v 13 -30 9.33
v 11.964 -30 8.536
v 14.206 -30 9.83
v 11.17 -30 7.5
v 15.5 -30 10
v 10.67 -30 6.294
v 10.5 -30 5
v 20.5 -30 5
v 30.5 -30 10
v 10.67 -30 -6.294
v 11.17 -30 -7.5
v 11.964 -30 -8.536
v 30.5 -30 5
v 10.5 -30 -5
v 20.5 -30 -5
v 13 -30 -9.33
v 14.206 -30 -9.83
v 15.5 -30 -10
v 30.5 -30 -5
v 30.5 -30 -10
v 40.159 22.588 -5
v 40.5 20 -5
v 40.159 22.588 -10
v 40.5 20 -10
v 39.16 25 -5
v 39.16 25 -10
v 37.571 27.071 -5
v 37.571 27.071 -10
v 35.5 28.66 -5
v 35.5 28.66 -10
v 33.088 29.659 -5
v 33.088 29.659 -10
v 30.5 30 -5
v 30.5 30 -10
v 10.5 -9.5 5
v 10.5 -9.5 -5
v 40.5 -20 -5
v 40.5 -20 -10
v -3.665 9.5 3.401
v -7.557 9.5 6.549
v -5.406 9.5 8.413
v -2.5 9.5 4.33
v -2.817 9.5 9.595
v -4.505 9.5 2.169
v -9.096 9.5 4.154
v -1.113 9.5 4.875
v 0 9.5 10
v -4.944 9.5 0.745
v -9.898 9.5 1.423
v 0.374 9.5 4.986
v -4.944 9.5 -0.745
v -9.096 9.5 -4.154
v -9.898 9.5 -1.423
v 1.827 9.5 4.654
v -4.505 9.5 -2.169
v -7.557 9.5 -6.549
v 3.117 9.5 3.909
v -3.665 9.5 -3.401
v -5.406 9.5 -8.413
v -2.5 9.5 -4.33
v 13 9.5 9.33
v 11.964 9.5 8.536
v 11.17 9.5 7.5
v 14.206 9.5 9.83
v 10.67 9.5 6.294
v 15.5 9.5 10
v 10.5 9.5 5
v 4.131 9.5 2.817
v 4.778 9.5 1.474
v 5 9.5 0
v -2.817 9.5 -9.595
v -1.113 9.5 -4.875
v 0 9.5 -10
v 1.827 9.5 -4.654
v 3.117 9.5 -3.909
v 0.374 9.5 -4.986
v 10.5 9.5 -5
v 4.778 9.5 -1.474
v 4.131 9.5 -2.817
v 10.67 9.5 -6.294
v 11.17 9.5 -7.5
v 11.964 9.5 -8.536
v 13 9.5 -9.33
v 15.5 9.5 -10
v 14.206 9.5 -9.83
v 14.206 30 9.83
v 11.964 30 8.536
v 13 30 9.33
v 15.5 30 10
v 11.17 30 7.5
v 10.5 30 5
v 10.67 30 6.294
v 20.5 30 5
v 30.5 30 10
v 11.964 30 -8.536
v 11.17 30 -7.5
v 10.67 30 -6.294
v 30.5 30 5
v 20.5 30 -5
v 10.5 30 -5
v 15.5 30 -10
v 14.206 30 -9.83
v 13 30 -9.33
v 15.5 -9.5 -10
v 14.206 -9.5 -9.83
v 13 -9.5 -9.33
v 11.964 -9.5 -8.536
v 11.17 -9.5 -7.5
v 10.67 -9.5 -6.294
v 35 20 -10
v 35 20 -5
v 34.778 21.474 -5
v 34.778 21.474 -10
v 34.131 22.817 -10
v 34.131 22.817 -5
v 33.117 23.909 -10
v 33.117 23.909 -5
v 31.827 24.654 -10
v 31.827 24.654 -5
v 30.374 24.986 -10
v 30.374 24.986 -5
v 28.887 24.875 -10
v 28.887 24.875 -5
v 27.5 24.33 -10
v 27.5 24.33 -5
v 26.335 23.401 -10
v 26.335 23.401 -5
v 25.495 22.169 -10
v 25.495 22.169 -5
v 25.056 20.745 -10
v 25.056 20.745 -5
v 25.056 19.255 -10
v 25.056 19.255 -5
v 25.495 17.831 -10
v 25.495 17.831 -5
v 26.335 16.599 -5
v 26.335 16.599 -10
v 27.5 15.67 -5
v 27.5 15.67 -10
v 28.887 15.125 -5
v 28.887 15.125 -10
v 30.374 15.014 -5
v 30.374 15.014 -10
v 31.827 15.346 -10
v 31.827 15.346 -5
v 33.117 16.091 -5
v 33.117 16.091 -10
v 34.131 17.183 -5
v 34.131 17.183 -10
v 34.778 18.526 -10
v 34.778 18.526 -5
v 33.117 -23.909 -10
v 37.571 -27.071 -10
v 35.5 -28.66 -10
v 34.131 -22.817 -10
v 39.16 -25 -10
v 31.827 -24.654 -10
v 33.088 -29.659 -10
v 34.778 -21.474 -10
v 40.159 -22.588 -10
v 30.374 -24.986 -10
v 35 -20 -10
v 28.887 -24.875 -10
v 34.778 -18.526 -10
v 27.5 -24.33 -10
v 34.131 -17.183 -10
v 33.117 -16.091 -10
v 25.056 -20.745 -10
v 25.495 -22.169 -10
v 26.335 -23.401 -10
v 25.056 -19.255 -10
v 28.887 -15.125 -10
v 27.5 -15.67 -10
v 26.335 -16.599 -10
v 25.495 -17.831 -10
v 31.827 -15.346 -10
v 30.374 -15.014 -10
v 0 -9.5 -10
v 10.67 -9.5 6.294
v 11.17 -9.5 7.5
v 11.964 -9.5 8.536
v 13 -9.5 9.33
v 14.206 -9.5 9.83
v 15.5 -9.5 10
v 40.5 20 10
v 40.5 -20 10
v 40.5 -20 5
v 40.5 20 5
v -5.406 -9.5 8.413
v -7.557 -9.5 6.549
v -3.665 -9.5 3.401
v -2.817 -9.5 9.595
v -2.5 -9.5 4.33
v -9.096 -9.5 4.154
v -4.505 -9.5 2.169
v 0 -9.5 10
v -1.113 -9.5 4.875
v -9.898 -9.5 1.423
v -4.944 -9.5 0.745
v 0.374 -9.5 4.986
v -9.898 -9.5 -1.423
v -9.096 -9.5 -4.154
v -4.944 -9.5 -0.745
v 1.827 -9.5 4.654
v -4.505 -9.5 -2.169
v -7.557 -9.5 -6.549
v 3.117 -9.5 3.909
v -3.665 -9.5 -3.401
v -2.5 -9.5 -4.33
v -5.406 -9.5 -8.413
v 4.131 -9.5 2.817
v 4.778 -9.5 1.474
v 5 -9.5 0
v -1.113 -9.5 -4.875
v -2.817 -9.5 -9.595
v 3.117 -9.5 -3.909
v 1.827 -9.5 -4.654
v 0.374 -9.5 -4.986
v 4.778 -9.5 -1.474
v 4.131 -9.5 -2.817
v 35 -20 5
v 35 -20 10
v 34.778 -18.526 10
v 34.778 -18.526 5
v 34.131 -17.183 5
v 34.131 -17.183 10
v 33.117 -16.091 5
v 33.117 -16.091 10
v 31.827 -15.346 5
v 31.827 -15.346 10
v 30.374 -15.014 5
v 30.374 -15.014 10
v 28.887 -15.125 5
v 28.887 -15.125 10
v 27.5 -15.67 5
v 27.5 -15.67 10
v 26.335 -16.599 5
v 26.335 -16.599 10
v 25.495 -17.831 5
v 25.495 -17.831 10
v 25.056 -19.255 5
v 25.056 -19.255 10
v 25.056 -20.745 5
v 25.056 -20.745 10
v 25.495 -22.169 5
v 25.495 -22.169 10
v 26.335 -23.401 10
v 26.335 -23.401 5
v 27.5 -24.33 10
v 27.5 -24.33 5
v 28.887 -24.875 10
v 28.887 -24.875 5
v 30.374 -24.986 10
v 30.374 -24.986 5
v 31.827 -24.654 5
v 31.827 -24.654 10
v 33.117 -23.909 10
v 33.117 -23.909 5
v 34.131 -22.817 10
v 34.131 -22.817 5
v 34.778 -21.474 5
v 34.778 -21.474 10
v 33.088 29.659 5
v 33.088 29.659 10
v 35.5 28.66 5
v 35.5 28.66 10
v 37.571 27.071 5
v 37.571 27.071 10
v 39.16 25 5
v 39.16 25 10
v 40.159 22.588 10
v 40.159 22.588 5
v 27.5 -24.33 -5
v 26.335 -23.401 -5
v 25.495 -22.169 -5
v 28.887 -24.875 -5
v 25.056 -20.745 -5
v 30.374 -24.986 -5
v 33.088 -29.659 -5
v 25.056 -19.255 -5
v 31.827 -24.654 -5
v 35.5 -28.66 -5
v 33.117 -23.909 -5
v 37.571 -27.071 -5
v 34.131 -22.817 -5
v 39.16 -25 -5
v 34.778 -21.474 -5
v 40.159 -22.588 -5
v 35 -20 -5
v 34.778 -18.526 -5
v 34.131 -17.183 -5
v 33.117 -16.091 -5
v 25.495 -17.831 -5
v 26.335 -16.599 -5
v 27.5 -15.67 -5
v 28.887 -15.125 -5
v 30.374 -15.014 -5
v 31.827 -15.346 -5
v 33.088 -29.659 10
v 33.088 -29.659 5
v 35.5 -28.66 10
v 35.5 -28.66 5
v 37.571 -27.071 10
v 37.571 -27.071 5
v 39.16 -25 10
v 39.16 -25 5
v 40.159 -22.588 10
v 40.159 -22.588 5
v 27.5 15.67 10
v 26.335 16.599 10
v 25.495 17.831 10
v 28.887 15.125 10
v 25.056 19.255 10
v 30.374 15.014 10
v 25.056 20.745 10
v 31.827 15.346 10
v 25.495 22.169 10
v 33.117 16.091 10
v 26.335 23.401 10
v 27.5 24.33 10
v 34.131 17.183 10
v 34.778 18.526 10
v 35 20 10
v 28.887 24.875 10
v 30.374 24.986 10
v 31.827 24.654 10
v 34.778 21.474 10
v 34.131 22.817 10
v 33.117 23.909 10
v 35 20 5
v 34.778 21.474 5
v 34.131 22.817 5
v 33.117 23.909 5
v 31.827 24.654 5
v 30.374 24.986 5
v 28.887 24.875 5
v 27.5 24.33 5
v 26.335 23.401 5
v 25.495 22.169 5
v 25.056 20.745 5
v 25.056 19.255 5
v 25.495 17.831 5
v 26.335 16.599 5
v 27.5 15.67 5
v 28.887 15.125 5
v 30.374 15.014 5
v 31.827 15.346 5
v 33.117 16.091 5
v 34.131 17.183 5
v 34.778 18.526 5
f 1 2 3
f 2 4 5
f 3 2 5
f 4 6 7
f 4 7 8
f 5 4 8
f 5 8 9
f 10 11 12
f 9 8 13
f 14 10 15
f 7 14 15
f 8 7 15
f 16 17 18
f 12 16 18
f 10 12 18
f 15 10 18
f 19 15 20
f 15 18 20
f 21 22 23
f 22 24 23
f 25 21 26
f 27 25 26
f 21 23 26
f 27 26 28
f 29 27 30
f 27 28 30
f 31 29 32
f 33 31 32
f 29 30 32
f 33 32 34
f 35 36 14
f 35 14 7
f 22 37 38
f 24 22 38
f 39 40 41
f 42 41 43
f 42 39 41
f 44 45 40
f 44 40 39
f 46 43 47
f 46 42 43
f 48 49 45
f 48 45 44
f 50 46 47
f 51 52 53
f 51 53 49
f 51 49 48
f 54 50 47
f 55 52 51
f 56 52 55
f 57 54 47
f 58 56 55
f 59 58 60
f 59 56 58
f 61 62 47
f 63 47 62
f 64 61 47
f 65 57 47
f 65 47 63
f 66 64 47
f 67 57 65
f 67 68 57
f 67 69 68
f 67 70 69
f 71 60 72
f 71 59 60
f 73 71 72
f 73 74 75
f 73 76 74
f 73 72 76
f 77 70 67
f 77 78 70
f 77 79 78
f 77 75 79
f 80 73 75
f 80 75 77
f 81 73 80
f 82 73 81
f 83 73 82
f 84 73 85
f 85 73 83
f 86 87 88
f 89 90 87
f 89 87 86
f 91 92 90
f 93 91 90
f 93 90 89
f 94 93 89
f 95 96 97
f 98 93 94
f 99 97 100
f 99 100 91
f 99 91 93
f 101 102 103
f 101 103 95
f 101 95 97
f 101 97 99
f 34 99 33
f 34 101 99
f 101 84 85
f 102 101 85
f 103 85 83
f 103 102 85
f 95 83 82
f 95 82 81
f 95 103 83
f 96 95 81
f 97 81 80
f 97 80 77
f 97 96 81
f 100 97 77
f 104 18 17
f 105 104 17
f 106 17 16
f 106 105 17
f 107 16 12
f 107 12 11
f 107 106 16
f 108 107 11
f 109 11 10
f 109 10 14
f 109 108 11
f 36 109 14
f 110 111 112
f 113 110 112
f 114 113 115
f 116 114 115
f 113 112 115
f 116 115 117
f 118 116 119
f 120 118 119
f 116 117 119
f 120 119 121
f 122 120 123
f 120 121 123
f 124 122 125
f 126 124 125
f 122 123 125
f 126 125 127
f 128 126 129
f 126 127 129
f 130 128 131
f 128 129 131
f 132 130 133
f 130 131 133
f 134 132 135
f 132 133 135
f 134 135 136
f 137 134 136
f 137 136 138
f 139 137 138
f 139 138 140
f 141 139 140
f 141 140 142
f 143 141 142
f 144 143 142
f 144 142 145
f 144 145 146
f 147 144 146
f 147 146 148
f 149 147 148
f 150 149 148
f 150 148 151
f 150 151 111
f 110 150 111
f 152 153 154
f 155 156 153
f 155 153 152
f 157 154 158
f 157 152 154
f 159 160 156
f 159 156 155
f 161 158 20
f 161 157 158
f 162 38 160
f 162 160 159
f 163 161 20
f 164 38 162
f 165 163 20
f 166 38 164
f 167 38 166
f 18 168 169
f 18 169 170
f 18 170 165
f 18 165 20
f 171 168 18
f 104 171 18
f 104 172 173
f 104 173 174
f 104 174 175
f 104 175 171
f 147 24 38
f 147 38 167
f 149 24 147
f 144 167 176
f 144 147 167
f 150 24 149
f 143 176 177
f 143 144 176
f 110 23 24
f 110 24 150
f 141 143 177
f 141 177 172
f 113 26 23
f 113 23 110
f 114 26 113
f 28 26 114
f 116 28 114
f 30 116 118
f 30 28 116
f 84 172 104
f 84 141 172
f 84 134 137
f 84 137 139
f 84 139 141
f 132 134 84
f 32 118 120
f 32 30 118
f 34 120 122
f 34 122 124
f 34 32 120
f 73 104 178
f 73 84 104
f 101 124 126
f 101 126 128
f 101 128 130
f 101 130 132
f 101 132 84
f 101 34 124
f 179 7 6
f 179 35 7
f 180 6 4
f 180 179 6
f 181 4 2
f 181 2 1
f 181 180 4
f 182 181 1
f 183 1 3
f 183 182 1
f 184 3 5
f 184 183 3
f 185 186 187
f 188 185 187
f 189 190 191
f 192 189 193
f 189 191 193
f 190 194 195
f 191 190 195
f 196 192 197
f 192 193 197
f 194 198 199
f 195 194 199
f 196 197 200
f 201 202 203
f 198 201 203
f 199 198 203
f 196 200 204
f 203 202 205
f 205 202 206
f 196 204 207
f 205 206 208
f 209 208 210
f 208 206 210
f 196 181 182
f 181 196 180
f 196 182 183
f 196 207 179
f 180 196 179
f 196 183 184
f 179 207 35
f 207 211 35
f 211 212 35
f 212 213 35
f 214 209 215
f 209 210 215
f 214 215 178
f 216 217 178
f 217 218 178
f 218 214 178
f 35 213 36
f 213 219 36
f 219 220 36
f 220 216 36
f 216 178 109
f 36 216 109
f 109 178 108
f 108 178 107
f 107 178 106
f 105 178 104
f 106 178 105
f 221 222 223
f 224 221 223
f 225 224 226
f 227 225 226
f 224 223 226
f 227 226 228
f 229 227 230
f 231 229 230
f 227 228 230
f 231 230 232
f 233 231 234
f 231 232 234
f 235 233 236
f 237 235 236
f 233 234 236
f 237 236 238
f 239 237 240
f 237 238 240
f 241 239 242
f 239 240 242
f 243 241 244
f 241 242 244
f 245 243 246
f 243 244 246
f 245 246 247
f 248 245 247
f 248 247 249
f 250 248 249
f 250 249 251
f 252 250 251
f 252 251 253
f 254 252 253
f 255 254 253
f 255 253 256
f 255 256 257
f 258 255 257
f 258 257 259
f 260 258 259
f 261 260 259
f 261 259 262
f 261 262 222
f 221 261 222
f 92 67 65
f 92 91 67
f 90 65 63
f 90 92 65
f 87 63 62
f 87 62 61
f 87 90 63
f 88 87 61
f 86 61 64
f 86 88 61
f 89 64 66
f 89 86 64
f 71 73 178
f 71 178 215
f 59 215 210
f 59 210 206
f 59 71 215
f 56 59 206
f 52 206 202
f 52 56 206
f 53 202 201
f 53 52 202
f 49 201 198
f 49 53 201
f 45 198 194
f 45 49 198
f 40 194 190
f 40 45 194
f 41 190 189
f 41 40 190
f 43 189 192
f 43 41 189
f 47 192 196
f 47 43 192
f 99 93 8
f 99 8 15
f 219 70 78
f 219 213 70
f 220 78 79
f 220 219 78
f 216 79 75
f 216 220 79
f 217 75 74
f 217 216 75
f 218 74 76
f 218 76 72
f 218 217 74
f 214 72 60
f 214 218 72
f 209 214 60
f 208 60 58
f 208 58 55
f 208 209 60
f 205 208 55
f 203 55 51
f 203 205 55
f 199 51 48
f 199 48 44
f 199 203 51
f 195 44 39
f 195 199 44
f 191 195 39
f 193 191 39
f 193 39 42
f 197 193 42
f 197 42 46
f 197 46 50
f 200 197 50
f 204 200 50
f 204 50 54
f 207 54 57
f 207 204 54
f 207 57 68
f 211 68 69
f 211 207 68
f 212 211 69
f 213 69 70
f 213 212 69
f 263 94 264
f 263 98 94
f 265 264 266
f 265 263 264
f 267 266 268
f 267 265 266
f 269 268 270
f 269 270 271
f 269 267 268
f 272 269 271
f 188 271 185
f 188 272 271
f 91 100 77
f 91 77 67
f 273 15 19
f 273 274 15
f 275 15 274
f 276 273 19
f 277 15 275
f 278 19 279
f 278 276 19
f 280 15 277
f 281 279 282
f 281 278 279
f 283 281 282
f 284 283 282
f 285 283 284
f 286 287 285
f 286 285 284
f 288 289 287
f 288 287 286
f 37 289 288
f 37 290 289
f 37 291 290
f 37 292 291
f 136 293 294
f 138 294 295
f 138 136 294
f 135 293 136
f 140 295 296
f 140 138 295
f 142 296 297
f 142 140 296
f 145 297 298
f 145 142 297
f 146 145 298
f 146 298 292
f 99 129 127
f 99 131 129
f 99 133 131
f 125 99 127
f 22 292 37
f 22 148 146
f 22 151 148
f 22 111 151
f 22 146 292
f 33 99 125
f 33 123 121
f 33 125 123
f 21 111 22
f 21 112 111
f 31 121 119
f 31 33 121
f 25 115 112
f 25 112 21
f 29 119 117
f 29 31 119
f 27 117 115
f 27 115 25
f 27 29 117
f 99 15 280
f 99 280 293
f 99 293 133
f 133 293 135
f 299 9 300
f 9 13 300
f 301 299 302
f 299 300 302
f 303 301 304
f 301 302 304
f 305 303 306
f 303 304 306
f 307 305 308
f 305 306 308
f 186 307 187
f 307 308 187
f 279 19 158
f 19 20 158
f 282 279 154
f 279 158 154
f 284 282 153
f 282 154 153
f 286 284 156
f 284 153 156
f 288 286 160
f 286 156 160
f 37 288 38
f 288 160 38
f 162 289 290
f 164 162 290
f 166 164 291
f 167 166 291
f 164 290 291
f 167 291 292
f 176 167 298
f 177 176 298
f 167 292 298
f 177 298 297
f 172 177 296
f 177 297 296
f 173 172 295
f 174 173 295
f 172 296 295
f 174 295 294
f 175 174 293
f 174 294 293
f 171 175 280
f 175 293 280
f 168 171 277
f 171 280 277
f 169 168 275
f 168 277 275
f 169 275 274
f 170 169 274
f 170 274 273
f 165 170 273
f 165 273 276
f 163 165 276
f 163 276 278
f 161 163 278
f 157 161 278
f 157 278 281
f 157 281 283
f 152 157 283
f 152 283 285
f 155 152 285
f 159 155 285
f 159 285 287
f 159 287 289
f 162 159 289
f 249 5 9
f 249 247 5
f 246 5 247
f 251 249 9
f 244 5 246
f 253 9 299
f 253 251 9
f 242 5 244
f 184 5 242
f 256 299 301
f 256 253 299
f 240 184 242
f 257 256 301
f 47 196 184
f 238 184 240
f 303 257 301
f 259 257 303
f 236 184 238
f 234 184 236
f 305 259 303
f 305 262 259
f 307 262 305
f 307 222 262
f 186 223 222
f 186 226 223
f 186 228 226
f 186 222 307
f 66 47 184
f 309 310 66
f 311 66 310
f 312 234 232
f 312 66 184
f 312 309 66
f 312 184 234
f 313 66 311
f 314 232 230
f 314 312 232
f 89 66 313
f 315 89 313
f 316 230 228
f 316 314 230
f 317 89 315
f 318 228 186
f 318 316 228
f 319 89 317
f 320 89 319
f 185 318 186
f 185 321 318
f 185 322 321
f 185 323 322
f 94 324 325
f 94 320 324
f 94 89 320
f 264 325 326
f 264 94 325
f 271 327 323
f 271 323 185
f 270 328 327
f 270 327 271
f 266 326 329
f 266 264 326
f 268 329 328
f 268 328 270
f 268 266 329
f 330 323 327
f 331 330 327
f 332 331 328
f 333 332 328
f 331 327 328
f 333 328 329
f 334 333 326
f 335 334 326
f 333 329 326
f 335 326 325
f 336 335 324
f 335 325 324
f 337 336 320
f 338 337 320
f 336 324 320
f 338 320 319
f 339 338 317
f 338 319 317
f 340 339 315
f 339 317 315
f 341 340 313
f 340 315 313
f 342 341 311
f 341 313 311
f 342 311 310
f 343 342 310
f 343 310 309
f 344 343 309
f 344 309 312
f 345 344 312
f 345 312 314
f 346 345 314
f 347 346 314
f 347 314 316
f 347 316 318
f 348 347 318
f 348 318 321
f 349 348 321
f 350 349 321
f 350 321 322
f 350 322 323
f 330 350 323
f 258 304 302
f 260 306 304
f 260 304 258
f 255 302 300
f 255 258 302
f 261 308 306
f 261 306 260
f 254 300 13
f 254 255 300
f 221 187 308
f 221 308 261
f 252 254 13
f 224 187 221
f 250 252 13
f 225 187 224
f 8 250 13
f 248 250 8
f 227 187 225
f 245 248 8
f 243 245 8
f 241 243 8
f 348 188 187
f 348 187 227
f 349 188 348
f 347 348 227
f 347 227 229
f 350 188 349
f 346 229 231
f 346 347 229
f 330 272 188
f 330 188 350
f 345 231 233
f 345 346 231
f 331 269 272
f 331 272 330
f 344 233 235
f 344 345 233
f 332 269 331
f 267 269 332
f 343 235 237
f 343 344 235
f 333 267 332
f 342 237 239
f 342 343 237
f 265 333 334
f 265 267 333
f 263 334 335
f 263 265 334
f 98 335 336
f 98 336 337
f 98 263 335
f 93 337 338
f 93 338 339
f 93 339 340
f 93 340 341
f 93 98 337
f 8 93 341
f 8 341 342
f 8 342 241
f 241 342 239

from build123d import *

# Parameters (mm, degrees)
SKETCH1_R           = 5
BOSS_EXTRUDE1_DEPTH = 9.5
BOSS_EXTRUDE2_DEPTH = 30
SKETCH2_R           = 5
CUT_EXTRUDE1_DEPTH  = 21
FILLET1_R           = 10
FILLET2_R           = 5


with BuildPart() as part:
    # Sketch1 → Boss-Extrude1 (new body, symmetric)
    with BuildSketch(Plane(origin=(0, 0, 0), x_dir=(1, 0, 0), z_dir=(0, 1, 0))):
        with BuildLine():
            Line((10.5, 10), (0, 10))
            ThreePointArc((0, 10), (-10, 0), (0, -10))
            Line((0, -10), (10.5, -10))
            Line((10.5, -10), (10.5, 10))
        make_face()
        Circle(SKETCH1_R, mode=Mode.SUBTRACT)
    extrude(amount=BOSS_EXTRUDE1_DEPTH, both=True)

    # Sketch1<3> → Boss-Extrude2 (add, symmetric)
    with BuildSketch(Plane(origin=(0, 0, 0), x_dir=(1, 0, 0), z_dir=(0, 1, 0))):
        Polygon((40.5, 10), (10.5, 10), (10.5, -10), (40.5, -10), (40.5, -5), (20.5, -5), (20.5, 5), (40.5, 5), align=None)
    extrude(amount=BOSS_EXTRUDE2_DEPTH, both=True)

    # Sketch2 → Cut-Extrude1 (cut, through all)
    with BuildSketch(Plane.XY.offset(10)):
        with Locations((30, 20)):
            Circle(SKETCH2_R)
        with Locations((30, -20)):
            Circle(SKETCH2_R)
    extrude(amount=-CUT_EXTRUDE1_DEPTH, mode=Mode.SUBTRACT)

    # Fillet1
    fillet1_edges = [part.edges().sort_by_distance(p)[0] for p in [
        (40.5, -30, -7.5),
        (40.5, -30, 7.5),
        (40.5, 30, -7.5),
        (40.5, 30, 7.5),
    ]]
    fillet(fillet1_edges, radius=FILLET1_R)

    # Fillet2
    fillet2_edges = [part.edges().sort_by_distance(p)[0] for p in [
        (10.5, 19.75, -10),
        (10.5, -19.75, -10),
        (10.5, 19.75, 10),
        (10.5, -19.75, 10),
    ]]
    fillet(fillet2_edges, radius=FILLET2_R)


solid = part.part
